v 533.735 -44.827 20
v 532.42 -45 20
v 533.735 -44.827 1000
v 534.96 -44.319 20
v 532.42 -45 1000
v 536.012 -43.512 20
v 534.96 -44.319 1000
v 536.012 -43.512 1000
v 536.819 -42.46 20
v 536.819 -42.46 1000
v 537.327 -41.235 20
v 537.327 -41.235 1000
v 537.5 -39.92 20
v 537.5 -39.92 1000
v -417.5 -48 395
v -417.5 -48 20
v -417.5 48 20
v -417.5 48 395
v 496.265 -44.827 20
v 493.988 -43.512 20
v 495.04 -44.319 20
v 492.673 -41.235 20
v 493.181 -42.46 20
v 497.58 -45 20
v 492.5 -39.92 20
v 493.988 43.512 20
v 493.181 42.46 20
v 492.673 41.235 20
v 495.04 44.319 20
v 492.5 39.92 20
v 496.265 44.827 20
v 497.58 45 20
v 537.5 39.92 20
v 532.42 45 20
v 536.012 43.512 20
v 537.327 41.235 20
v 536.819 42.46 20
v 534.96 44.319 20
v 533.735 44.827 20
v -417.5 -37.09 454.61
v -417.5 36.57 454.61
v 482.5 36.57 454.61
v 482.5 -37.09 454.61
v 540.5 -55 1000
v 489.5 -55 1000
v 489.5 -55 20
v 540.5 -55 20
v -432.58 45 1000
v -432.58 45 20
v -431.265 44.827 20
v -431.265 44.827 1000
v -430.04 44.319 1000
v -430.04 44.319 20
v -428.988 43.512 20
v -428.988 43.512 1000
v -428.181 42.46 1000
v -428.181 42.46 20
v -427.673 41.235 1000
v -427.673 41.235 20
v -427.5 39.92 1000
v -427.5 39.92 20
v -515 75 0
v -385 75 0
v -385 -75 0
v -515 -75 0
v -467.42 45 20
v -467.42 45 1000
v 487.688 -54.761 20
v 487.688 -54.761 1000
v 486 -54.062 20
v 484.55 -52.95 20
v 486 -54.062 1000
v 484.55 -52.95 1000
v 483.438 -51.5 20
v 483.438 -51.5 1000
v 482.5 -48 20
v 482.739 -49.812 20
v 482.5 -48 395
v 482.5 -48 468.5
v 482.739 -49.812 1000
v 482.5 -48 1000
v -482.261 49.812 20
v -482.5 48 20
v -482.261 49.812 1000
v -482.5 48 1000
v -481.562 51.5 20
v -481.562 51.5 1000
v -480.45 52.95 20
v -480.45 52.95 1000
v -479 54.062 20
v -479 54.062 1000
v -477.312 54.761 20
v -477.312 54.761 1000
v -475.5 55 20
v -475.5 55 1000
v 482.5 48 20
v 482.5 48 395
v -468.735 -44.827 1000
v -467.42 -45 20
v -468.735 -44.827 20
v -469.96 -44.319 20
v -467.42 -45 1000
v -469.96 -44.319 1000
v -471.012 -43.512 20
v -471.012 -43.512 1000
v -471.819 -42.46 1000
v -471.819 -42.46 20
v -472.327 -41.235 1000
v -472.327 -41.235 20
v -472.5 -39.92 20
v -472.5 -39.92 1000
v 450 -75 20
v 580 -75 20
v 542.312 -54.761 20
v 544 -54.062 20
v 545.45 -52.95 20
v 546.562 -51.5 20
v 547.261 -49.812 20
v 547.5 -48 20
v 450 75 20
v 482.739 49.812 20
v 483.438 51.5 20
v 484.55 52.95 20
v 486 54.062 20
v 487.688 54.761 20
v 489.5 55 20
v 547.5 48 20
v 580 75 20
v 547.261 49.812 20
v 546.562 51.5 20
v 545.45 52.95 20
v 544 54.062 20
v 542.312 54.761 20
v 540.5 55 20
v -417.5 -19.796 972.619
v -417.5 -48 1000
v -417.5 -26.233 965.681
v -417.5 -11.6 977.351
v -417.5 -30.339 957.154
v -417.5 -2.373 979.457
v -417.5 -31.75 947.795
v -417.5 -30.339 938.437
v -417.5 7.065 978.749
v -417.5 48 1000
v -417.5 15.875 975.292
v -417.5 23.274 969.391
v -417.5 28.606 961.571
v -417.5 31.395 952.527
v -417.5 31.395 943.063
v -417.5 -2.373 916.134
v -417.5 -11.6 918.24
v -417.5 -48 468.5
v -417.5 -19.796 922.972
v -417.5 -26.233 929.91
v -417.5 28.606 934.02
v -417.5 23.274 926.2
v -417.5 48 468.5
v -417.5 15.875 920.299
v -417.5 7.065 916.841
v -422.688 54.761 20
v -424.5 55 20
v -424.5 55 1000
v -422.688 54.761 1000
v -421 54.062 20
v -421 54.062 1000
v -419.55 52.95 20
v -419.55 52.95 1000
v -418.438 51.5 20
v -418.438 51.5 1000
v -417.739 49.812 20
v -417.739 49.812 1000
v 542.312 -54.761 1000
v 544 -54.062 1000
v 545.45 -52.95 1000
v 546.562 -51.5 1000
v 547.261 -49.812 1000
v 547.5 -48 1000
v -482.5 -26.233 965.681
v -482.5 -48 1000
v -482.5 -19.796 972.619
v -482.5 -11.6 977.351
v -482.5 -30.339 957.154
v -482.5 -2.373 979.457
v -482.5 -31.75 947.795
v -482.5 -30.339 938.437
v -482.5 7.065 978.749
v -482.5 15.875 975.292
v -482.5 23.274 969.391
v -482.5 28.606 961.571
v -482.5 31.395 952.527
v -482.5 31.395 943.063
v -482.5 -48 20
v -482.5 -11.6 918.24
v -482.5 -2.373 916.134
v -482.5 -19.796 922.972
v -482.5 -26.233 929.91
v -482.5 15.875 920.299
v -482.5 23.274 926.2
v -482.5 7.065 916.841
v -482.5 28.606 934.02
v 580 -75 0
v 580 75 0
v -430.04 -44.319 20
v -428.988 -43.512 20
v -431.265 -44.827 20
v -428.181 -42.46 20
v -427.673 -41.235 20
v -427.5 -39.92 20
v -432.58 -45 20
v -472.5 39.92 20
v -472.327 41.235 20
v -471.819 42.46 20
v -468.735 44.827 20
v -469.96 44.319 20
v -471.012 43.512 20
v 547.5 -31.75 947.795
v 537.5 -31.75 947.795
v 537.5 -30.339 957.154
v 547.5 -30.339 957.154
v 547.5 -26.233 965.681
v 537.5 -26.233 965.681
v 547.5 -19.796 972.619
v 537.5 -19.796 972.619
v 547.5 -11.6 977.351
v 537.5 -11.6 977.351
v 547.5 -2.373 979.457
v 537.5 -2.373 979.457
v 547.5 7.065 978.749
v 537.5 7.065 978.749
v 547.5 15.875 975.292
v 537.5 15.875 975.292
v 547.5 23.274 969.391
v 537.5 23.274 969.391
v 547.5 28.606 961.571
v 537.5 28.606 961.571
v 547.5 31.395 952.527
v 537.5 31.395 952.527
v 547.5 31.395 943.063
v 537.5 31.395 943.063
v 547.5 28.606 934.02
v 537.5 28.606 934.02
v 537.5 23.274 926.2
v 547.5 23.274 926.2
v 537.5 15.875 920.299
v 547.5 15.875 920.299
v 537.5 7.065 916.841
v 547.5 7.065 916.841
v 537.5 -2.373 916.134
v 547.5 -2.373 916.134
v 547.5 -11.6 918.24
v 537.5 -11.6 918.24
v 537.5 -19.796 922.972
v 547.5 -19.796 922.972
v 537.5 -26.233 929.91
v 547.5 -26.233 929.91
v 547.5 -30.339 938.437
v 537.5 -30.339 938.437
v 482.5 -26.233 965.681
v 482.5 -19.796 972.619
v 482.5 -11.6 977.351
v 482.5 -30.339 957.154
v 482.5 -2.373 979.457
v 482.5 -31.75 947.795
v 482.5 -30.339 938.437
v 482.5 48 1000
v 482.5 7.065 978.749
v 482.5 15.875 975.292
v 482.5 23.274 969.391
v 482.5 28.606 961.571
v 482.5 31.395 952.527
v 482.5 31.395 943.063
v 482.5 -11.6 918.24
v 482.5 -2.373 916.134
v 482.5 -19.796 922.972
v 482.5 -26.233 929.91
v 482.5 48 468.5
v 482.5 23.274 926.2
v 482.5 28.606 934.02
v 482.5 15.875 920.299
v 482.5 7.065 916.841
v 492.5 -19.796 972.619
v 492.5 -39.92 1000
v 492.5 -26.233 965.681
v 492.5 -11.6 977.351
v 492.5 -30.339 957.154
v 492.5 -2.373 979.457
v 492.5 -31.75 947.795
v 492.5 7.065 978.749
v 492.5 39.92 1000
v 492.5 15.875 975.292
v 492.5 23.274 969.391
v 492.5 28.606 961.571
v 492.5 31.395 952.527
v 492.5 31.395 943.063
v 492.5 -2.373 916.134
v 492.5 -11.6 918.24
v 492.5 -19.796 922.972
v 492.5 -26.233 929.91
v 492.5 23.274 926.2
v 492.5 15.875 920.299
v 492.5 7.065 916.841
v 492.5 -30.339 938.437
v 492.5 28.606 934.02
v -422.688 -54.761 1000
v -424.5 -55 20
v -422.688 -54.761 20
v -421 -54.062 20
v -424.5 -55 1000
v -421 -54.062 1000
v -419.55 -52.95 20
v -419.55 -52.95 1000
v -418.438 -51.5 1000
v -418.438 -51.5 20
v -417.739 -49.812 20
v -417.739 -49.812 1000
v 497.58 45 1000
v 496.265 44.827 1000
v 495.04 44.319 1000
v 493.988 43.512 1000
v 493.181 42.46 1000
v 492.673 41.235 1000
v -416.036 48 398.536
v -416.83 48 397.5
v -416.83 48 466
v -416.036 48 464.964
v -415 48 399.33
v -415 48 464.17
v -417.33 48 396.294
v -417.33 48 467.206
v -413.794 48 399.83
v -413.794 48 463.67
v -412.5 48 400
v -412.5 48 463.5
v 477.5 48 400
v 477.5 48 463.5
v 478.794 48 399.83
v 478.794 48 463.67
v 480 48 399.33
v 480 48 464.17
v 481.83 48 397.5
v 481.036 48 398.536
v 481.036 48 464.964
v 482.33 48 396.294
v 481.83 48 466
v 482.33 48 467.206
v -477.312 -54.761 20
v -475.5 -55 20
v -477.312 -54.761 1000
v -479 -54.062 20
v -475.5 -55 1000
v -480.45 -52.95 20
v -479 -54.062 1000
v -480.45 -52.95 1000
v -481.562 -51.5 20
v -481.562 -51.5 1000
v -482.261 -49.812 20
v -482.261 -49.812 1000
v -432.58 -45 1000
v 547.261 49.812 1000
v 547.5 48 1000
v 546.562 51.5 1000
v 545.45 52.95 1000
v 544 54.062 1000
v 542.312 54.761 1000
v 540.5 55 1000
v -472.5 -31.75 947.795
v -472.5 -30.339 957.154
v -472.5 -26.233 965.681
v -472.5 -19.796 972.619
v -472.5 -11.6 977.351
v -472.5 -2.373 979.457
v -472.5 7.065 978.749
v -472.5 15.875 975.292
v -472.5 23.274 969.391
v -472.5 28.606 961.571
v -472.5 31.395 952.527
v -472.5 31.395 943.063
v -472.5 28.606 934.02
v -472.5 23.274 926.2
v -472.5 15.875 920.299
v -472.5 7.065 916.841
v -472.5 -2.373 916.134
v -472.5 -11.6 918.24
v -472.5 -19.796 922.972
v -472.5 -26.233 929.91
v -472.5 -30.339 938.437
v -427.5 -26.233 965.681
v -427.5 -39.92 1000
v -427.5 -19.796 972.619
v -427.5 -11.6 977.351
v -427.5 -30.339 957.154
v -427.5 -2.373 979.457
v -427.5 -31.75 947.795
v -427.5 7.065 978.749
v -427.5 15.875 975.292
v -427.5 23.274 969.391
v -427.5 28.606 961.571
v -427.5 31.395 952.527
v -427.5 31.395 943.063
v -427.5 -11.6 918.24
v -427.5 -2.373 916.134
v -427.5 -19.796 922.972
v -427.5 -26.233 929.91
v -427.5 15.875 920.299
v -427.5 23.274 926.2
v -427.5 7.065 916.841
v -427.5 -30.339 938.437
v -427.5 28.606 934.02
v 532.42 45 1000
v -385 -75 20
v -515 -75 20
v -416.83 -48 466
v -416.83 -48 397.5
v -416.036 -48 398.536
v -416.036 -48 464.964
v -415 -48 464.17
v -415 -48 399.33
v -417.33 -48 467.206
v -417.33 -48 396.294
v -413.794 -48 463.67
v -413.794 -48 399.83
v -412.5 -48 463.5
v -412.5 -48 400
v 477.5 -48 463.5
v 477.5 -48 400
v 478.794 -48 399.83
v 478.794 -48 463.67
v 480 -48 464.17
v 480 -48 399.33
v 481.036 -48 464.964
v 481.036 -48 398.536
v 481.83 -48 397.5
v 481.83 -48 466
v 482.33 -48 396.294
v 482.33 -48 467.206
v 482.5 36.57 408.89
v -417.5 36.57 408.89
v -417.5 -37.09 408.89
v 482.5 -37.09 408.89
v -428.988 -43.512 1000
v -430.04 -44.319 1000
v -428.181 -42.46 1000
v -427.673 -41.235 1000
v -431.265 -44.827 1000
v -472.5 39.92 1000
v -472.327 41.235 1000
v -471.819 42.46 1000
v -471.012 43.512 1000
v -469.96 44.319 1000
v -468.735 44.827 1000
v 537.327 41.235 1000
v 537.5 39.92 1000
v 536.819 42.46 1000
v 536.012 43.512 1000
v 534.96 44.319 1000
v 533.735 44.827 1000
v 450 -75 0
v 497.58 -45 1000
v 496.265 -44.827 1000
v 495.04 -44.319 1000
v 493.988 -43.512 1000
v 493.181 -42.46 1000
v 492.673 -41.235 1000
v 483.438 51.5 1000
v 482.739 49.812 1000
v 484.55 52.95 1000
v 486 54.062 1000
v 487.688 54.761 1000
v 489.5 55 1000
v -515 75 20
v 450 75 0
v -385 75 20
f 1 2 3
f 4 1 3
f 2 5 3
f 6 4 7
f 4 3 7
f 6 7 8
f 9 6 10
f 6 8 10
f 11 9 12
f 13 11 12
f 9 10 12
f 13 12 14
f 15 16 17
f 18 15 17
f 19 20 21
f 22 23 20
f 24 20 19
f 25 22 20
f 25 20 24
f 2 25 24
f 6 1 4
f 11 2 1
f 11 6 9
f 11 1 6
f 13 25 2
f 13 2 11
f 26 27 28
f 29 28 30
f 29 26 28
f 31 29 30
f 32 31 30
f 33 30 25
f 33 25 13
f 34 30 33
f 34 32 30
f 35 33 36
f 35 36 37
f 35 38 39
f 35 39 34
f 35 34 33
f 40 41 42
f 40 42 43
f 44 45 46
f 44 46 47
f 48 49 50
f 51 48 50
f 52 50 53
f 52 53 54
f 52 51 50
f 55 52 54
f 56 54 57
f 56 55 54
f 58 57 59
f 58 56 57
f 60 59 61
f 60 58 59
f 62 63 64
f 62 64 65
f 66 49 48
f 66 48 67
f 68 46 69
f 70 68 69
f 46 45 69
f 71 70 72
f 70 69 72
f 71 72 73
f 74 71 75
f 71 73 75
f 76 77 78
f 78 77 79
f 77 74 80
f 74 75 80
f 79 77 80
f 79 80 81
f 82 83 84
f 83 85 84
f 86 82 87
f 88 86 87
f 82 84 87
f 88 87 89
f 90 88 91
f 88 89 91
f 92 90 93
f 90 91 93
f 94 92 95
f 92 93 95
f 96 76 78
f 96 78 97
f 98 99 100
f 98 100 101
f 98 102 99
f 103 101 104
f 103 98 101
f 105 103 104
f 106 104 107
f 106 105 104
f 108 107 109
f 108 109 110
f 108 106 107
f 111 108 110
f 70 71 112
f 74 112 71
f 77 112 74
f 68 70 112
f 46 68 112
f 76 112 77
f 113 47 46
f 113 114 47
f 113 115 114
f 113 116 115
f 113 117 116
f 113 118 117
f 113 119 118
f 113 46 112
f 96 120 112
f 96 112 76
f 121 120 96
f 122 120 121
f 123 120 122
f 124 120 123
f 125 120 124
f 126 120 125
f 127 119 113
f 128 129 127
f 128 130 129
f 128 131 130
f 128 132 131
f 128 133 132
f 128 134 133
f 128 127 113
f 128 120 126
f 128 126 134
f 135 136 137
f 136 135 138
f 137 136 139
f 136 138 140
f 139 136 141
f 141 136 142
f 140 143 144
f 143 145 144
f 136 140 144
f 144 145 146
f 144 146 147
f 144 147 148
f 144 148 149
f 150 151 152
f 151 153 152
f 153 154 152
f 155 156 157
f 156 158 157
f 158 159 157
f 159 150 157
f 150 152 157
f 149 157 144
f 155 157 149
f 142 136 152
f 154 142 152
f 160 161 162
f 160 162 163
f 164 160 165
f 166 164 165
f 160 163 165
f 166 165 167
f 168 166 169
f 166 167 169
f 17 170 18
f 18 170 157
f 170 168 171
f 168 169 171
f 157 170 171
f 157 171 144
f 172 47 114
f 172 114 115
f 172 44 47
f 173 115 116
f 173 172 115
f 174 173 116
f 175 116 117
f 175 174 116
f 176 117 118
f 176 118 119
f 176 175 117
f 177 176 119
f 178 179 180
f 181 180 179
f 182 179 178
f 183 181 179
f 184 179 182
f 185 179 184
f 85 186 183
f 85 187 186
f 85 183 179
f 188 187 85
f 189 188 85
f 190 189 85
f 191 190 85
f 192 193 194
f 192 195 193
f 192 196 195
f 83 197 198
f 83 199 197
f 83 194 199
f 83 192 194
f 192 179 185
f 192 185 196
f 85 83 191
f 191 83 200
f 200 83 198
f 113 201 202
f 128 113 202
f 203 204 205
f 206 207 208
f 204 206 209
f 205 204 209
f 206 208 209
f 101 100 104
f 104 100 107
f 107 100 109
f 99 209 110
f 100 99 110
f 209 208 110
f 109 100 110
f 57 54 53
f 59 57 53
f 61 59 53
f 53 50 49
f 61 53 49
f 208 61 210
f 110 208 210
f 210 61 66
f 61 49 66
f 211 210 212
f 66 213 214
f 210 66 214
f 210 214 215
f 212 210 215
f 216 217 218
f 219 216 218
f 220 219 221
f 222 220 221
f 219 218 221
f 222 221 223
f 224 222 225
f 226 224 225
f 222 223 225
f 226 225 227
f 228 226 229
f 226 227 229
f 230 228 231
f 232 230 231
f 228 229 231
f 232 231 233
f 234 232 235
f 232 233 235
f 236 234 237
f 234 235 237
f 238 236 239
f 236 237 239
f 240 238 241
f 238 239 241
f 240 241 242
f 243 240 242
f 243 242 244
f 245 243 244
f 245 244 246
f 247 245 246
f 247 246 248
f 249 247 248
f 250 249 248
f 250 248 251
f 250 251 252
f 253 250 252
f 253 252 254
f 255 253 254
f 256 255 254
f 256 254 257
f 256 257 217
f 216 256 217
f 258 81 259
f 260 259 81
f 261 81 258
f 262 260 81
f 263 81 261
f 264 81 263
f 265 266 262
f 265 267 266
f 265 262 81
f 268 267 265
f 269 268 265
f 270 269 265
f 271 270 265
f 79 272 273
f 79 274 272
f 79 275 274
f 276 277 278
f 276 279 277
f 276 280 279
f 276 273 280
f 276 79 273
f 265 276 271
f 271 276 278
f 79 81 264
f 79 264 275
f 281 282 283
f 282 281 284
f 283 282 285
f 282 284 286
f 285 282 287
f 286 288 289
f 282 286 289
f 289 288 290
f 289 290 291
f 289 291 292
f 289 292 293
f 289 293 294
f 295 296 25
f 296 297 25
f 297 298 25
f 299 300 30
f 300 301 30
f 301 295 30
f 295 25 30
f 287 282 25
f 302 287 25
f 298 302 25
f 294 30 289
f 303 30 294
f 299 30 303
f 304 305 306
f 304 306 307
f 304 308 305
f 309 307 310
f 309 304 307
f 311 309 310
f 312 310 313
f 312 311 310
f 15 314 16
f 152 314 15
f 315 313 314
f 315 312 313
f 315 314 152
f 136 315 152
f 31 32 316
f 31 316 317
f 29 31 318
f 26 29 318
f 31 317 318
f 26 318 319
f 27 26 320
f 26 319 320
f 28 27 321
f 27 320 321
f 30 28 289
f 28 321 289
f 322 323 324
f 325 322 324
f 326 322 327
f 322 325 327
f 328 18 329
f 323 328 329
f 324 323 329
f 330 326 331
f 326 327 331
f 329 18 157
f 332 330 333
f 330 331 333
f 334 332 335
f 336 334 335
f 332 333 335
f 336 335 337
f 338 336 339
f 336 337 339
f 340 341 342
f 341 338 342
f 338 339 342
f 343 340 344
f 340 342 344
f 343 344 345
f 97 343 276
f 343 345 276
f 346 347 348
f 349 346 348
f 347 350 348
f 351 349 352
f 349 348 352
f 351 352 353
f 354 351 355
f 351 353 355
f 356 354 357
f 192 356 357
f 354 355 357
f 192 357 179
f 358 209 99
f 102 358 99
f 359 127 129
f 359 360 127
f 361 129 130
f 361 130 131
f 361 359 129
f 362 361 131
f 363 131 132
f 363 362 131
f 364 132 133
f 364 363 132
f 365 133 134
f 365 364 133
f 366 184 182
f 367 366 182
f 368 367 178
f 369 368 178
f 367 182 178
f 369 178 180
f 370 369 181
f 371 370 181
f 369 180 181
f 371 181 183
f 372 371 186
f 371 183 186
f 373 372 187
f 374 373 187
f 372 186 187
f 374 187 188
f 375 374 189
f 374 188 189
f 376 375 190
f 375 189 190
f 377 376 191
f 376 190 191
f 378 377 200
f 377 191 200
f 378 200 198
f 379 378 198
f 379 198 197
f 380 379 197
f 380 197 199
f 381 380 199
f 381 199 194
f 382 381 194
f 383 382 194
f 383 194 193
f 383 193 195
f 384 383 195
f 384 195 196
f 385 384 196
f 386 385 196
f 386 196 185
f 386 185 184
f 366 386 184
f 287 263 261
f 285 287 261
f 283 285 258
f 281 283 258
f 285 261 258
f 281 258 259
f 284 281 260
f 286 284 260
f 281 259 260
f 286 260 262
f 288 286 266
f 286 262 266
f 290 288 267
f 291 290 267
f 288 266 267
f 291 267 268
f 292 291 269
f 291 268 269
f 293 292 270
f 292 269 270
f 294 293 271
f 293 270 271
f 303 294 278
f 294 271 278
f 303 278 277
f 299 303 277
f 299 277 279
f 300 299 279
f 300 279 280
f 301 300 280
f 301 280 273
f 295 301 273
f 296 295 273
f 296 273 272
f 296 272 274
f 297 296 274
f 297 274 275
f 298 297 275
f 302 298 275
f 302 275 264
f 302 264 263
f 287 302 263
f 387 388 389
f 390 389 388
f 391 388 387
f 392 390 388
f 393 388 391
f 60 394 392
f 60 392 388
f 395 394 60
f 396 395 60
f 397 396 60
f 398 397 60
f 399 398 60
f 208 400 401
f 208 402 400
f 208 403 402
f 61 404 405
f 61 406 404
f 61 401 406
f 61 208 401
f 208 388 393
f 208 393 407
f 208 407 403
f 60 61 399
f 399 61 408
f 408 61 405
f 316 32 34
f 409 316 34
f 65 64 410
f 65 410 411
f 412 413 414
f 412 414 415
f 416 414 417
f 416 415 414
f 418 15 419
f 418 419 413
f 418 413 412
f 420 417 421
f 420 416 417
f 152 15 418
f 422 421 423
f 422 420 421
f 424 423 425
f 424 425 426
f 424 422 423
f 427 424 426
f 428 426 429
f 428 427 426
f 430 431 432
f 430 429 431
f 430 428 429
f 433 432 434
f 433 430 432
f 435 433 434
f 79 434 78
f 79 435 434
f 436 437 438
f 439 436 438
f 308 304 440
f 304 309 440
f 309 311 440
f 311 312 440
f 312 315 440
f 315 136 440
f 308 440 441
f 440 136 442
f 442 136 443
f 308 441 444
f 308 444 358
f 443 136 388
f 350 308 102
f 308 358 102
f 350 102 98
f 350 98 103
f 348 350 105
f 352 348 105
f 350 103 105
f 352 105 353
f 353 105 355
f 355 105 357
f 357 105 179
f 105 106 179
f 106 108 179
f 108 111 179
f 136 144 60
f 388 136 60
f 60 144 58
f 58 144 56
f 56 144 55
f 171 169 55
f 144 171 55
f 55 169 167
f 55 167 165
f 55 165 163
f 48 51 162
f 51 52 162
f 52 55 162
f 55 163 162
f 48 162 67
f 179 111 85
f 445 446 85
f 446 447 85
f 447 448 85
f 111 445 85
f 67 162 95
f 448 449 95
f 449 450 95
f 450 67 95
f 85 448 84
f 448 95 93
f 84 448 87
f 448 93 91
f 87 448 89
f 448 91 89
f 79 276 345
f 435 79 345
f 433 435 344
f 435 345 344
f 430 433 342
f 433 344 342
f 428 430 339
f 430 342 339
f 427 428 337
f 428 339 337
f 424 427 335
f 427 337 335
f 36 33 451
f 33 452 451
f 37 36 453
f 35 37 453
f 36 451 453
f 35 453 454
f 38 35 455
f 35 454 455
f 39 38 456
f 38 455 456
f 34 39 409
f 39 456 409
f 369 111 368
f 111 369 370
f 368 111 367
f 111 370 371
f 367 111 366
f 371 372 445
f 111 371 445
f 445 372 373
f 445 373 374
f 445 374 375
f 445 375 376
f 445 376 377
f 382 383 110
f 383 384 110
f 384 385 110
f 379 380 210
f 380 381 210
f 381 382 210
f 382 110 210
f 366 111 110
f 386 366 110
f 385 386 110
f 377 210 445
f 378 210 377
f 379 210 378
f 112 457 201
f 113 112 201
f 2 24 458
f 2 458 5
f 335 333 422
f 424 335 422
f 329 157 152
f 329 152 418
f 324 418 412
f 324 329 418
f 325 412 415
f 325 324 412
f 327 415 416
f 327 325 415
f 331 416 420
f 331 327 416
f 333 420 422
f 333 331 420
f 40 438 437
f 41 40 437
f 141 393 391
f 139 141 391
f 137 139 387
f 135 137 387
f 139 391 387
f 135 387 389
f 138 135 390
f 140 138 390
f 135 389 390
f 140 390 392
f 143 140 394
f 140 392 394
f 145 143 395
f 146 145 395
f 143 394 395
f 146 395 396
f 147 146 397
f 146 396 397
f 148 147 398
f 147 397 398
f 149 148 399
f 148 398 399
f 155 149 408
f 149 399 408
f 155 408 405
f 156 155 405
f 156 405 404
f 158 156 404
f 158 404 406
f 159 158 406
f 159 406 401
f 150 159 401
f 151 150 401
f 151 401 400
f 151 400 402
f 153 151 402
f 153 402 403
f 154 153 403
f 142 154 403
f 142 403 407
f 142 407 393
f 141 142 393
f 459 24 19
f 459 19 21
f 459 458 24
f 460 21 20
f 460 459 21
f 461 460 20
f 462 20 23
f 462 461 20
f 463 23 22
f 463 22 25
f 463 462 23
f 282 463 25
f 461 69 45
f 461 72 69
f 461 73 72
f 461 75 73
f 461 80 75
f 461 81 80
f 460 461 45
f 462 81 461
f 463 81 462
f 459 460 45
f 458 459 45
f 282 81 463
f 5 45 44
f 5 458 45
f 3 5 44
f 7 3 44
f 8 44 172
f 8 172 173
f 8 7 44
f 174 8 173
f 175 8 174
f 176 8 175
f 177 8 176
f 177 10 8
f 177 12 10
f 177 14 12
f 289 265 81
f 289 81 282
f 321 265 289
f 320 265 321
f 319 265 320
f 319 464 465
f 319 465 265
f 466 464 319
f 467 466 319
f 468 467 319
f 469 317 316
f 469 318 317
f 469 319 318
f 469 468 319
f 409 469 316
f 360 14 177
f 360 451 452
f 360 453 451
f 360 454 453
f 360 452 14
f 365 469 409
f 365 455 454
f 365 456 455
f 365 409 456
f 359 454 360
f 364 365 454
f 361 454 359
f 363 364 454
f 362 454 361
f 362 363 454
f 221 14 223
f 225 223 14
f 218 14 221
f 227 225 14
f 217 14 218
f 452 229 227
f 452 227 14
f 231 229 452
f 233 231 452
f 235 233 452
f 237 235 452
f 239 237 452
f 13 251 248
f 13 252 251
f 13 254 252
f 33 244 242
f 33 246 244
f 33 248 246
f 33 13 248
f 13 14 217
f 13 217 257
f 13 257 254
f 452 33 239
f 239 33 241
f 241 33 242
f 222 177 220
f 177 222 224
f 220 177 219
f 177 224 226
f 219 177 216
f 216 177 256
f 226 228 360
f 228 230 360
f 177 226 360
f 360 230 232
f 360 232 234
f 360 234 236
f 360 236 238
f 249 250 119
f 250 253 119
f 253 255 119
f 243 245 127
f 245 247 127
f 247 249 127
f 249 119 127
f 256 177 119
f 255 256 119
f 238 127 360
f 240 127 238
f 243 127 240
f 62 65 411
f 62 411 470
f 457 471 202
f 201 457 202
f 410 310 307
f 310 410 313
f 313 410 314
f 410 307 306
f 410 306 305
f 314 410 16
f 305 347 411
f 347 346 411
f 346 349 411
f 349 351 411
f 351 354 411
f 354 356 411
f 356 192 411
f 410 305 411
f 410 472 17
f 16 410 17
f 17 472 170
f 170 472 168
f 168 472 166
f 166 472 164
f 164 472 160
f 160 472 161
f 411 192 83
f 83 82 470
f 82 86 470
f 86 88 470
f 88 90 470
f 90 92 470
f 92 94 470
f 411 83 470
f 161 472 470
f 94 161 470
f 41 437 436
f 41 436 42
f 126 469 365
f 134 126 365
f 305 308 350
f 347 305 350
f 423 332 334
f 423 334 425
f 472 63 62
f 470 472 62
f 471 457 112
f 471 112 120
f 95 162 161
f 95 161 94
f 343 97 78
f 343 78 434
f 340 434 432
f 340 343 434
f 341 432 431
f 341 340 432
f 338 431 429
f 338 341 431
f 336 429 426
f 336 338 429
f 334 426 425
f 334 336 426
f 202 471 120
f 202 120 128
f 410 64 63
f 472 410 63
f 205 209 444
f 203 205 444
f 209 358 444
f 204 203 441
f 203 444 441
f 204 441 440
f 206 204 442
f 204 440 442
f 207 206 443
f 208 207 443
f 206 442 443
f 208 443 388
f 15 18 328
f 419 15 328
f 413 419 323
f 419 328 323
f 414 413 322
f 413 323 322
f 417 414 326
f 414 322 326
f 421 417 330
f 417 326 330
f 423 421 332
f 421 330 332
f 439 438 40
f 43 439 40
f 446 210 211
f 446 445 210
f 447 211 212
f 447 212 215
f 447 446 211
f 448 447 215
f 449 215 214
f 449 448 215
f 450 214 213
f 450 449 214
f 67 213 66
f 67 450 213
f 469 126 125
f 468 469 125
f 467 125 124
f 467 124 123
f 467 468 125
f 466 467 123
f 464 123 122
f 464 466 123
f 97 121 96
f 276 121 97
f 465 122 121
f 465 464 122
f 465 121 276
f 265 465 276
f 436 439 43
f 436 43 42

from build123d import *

# Parameters (mm, degrees)
F0_W        = 130
F0_H        = 150
F1_DEPTH    = 20
F2_W        = 65
F2_H        = 110
F2_W_2      = 45
F2_H_2      = 90
F3_DEPTH    = 980
F4_R        = 7
F5_R        = 5.08
F6_W        = 96
F6_H        = 63.5
F6_W_2      = 73.66
F6_H_2      = 45.72
F7_DEPTH    = 450
F8_T1_DEPTH = 96
F9_T1_DEPTH = 96
F13_D       = 63.5


# Not quite as in the source:
# - a fillet or chamfer that OpenCascade refuses, or shapes differently, is made with other operations: its cross-section is extruded or revolved along the edge and cut away or added


with BuildPart() as f1:
    # F0 (on Top) → F1 (new body)
    with BuildSketch(Plane.XY):
        with Locations((515, 0)):
            Rectangle(F0_W, F0_H)
    extrude(amount=F1_DEPTH)

    # F2 (on face) → F3 (join)
    with BuildSketch(Plane.XY.offset(20)):
        with Locations((515, 0)):
            Rectangle(F2_W, F2_H)
        with Locations((515, 0)):
            Rectangle(F2_W_2, F2_H_2, mode=Mode.SUBTRACT)
    extrude(amount=F3_DEPTH)

    # F4
    f4_edges = [f1.edges().sort_by_distance(p)[0] for p in [
        (547.5, -55, 510),
        (482.5, -55, 510),
        (547.5, 55, 510),
        (482.5, 55, 510),
    ]]
    fillet(f4_edges, radius=F4_R)

    # F5
    f5_edges = [f1.edges().sort_by_distance(p)[0] for p in [
        (492.5, 45, 510),
        (492.5, -45, 510),
        (537.5, -45, 510),
        (537.5, 45, 510),
    ]]
    fillet(f5_edges, radius=F5_R)

    # F6 (on face) → F7 (join)
    with BuildSketch(Plane(origin=(482.5, 0, 0), x_dir=(0, -1, 0), z_dir=(-1, 0, 0))):
        with Locations((0, 431.75)):
            Rectangle(F6_W, F6_H)
        with Locations((0.26, 431.75)):
            Rectangle(F6_W_2, F6_H_2, mode=Mode.SUBTRACT)
    extrude(amount=F7_DEPTH)

    # F8: fillet of radius 5 on 1 edges, made by hand

    # F8_s2 → F8_t1 (join)
    with BuildSketch(Plane.XZ.offset(-48)):
        with BuildLine():
            ThreePointArc((482.5, 468.5), (481.0355339059, 464.9644660941), (477.5, 463.5))
            Line((477.5, 463.5), (482.5, 463.5))
            Line((482.5, 463.5), (482.5, 468.5))
        make_face()
    extrude(amount=F8_T1_DEPTH)

    # F9: fillet of radius 5 on 1 edges, made by hand

    # F9_s2 → F9_t1 (join)
    with BuildSketch(Plane.XZ.offset(-48)):
        with BuildLine():
            ThreePointArc((482.5, 395), (481.0355339059, 398.5355339059), (477.5, 400))
            Line((477.5, 400), (482.5, 400))
            Line((482.5, 400), (482.5, 395))
        make_face()
    extrude(amount=F9_T1_DEPTH)

    # F11: F1 across face


with BuildPart() as f1_1:
    add(f1.part)
    add(f1.part.mirror(Plane(origin=(32.5, 0, 0), x_dir=(0, -1, 0), z_dir=(-1, 0, 0))))

    # F13 (through all)
    with Locations(Plane.YZ.offset(547.5)):
        with Locations((0, 947.7953910828)):
            Hole(F13_D / 2)


solid = f1_1.part
